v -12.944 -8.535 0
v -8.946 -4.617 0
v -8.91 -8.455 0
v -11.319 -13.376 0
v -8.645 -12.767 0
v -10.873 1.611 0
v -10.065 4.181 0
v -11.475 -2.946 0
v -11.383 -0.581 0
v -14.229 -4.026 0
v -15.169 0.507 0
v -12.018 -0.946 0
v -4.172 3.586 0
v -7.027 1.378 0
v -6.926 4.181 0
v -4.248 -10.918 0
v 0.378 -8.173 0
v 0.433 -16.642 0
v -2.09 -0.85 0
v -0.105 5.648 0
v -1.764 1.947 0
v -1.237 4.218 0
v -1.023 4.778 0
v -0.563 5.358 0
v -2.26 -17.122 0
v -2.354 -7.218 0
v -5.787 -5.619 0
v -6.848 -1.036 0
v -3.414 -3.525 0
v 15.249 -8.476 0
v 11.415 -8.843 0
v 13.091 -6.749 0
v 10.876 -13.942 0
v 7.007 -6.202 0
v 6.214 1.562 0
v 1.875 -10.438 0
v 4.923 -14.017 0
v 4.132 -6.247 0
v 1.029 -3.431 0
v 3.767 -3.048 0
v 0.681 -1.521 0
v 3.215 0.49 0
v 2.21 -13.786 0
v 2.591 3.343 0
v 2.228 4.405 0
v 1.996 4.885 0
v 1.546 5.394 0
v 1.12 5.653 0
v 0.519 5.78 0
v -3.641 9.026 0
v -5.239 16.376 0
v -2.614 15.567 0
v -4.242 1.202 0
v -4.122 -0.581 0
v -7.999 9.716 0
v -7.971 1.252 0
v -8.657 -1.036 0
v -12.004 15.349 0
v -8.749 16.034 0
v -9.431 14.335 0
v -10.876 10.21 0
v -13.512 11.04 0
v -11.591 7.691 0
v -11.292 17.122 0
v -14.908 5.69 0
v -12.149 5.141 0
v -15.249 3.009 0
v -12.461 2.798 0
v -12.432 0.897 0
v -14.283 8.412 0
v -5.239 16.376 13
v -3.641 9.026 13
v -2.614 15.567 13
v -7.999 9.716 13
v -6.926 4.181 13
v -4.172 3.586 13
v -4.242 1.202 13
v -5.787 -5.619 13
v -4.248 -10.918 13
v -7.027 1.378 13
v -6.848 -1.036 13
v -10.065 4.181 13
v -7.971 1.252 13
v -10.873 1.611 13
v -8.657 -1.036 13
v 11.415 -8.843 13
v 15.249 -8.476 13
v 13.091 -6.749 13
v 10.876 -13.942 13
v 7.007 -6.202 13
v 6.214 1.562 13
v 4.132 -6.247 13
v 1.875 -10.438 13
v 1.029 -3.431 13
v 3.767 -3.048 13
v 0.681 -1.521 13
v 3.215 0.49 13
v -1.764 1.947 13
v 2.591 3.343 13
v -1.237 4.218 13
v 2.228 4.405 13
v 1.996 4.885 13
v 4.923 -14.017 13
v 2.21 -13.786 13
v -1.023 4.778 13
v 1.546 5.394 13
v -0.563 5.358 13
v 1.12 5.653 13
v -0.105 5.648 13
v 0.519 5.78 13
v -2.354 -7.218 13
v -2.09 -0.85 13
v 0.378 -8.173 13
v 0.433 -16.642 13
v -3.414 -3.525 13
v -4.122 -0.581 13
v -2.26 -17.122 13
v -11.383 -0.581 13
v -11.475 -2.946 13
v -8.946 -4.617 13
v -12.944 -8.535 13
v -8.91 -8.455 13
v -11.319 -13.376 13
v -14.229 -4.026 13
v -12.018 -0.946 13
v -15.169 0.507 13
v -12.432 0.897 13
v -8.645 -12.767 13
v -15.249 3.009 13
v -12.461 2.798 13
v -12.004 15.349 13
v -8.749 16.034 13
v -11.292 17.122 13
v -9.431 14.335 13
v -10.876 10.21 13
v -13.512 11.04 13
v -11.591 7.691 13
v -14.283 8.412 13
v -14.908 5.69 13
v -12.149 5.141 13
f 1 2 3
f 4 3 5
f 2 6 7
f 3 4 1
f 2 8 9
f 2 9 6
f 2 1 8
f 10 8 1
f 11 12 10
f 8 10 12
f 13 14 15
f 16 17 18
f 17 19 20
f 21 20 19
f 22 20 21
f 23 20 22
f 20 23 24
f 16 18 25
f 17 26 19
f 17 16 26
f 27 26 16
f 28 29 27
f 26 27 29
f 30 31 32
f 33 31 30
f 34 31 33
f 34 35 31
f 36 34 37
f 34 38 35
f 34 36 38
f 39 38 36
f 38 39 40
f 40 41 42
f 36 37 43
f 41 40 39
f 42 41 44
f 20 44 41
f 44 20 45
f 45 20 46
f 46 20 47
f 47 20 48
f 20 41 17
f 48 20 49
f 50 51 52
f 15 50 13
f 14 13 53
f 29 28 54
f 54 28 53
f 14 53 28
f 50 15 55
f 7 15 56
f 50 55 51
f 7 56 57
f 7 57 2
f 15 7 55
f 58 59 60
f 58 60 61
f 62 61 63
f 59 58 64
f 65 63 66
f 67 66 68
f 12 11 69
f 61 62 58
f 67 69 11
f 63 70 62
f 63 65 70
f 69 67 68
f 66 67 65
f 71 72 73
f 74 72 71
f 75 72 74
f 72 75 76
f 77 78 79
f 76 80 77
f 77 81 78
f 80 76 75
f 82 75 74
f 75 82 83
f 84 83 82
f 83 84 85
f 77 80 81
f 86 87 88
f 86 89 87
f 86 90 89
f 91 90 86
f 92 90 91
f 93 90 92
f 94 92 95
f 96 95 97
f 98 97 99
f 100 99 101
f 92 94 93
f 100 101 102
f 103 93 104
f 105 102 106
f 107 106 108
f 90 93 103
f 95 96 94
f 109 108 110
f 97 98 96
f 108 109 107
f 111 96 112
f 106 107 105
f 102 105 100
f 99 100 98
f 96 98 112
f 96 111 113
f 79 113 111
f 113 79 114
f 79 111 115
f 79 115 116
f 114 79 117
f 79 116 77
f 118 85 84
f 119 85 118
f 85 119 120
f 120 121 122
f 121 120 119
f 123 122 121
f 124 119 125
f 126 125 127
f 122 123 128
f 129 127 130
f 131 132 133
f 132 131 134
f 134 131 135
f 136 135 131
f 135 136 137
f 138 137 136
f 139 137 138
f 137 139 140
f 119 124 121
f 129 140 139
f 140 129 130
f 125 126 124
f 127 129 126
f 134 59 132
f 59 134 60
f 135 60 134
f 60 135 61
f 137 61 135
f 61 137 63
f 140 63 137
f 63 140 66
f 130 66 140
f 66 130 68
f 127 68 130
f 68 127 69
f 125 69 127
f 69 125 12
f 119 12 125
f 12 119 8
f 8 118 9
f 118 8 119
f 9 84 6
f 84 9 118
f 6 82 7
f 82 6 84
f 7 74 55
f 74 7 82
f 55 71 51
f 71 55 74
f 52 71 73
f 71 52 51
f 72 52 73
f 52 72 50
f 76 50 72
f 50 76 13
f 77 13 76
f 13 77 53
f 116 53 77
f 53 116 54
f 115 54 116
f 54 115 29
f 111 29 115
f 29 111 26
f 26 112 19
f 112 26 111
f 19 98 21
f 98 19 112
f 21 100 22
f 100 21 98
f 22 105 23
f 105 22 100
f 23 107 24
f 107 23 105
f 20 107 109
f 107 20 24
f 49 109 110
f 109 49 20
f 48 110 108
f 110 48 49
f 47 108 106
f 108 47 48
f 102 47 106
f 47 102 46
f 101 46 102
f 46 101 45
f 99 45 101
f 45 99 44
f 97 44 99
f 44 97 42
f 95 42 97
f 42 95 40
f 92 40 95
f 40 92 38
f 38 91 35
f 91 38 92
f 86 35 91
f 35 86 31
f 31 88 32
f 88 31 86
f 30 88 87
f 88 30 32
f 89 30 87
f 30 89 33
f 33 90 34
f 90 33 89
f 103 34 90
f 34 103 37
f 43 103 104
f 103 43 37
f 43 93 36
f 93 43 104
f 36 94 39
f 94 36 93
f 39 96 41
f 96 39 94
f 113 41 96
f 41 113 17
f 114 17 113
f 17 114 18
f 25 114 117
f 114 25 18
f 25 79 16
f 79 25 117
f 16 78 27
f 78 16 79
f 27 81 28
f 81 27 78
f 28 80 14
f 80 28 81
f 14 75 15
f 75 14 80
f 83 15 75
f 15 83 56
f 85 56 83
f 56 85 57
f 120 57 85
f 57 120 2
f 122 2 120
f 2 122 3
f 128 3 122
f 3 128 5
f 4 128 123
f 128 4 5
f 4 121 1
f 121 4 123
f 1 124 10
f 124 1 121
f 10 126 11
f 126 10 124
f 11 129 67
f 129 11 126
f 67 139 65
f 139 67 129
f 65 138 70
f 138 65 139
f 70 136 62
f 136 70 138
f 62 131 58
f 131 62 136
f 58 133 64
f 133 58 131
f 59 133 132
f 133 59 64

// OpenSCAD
// Generated by inkscape 0.92.5 (2060ec1f9f, 2020-04-08) + inkscape-paths2openscad 0.25
// Sun Feb  7 17:20:58 2021 from "anglerfish.svg"

// Module names are of the form poly_<inkscape-path-id>().  As a result,
// you can associate a polygon in this OpenSCAD program with the corresponding
// SVG element in the Inkscape document by looking for the XML element with
// the attribute id="inkscape-path-id".

// fudge value is used to ensure that subtracted solids are a tad taller
// in the z dimension than the polygon being subtracted from.  This helps
// keep the resulting .stl file manifold.
fudge = 0.1;
zsize01 = 13;
line_fn = 4;
min_line_width = 1.0;
line_width_scale = 1.0;
function min_line_mm(w) = max(min_line_width, w * line_width_scale) * 96/25.4;


path823_0_center = [0.000000,0.000000];
path823_0_points = [[-42.676914,-64.713343],[-45.367714,-58.010931],[-51.070123,-41.726140],[-53.981942,-31.793452],[-56.345017,-21.503832],[-57.635606,-11.372726],[-57.329967,-1.915578],[-53.780553,15.215065],[-48.920872,32.259330],[-42.780262,50.554891],[-32.674450,48.251760],[-33.675161,31.955314],[-33.812708,17.448860],[-32.718746,3.916120],[-30.127652,-4.730774],[-26.178390,-15.800922],[-26.560137,-5.206569],[-25.883096,3.916120],[-21.870405,21.235504],[-16.054572,41.265680],[-8.543037,64.713343],[1.636593,62.897431],[1.429890,30.889515],[2.574082,5.746810],[3.888061,12.966313],[7.088146,39.449934],[8.354103,52.105102],[18.607550,52.976170],[26.484026,23.441200],[41.107553,52.695653],[57.635606,32.033730],[49.478618,25.508148],[43.144956,33.421535],[23.486981,-5.901809],[15.617883,23.610976],[14.237471,11.519434],[12.149726,-1.853358],[9.793574,-12.634093],[8.420543,-16.649841],[7.544316,-18.463301],[5.844262,-20.385073],[4.234707,-21.367443],[1.961386,-21.846692],[-0.397069,-21.345489],[-2.128180,-20.252185],[-3.866363,-18.058216],[-4.674932,-15.941180],[-6.668284,-7.360331],[-7.898824,3.212070],[-8.897375,27.279802],[-12.901936,13.321764],[-15.577986,2.196133],[-16.034078,-4.541586],[-15.768817,-13.552556],[-13.762040,-34.115380],[-9.879164,-58.837349],[-19.800425,-61.893437],[-30.231038,-36.721214],[-38.040150,-15.802400],[-41.096365,-6.087409],[-43.023856,2.196133],[-43.370817,11.135586],[-45.422757,3.577243],[-46.987942,-3.391975],[-47.095194,-10.576613],[-45.919144,-19.432424],[-43.806651,-29.067224],[-41.104574,-38.588830],[-35.644511,-54.179038],[-33.065696,-60.601632],[-42.676914,-64.713343]];
module poly_path823(h, w, s, res=line_fn)
{
  scale([25.4/96, -25.4/96, 1]) union()
  {
    translate (path823_0_center) linear_extrude(height=h, convexity=10, scale=0.01*s)
      translate (-path823_0_center) polygon(path823_0_points);
  }
}

module anglerfish_01(h)
{
  difference()
  {
    union()
    {
      translate ([0,0,0]) poly_path823(h, min_line_mm(2.7650001), 100.0);
    }
    union()
    {
    }
  }
}

anglerfish_01(zsize01);
